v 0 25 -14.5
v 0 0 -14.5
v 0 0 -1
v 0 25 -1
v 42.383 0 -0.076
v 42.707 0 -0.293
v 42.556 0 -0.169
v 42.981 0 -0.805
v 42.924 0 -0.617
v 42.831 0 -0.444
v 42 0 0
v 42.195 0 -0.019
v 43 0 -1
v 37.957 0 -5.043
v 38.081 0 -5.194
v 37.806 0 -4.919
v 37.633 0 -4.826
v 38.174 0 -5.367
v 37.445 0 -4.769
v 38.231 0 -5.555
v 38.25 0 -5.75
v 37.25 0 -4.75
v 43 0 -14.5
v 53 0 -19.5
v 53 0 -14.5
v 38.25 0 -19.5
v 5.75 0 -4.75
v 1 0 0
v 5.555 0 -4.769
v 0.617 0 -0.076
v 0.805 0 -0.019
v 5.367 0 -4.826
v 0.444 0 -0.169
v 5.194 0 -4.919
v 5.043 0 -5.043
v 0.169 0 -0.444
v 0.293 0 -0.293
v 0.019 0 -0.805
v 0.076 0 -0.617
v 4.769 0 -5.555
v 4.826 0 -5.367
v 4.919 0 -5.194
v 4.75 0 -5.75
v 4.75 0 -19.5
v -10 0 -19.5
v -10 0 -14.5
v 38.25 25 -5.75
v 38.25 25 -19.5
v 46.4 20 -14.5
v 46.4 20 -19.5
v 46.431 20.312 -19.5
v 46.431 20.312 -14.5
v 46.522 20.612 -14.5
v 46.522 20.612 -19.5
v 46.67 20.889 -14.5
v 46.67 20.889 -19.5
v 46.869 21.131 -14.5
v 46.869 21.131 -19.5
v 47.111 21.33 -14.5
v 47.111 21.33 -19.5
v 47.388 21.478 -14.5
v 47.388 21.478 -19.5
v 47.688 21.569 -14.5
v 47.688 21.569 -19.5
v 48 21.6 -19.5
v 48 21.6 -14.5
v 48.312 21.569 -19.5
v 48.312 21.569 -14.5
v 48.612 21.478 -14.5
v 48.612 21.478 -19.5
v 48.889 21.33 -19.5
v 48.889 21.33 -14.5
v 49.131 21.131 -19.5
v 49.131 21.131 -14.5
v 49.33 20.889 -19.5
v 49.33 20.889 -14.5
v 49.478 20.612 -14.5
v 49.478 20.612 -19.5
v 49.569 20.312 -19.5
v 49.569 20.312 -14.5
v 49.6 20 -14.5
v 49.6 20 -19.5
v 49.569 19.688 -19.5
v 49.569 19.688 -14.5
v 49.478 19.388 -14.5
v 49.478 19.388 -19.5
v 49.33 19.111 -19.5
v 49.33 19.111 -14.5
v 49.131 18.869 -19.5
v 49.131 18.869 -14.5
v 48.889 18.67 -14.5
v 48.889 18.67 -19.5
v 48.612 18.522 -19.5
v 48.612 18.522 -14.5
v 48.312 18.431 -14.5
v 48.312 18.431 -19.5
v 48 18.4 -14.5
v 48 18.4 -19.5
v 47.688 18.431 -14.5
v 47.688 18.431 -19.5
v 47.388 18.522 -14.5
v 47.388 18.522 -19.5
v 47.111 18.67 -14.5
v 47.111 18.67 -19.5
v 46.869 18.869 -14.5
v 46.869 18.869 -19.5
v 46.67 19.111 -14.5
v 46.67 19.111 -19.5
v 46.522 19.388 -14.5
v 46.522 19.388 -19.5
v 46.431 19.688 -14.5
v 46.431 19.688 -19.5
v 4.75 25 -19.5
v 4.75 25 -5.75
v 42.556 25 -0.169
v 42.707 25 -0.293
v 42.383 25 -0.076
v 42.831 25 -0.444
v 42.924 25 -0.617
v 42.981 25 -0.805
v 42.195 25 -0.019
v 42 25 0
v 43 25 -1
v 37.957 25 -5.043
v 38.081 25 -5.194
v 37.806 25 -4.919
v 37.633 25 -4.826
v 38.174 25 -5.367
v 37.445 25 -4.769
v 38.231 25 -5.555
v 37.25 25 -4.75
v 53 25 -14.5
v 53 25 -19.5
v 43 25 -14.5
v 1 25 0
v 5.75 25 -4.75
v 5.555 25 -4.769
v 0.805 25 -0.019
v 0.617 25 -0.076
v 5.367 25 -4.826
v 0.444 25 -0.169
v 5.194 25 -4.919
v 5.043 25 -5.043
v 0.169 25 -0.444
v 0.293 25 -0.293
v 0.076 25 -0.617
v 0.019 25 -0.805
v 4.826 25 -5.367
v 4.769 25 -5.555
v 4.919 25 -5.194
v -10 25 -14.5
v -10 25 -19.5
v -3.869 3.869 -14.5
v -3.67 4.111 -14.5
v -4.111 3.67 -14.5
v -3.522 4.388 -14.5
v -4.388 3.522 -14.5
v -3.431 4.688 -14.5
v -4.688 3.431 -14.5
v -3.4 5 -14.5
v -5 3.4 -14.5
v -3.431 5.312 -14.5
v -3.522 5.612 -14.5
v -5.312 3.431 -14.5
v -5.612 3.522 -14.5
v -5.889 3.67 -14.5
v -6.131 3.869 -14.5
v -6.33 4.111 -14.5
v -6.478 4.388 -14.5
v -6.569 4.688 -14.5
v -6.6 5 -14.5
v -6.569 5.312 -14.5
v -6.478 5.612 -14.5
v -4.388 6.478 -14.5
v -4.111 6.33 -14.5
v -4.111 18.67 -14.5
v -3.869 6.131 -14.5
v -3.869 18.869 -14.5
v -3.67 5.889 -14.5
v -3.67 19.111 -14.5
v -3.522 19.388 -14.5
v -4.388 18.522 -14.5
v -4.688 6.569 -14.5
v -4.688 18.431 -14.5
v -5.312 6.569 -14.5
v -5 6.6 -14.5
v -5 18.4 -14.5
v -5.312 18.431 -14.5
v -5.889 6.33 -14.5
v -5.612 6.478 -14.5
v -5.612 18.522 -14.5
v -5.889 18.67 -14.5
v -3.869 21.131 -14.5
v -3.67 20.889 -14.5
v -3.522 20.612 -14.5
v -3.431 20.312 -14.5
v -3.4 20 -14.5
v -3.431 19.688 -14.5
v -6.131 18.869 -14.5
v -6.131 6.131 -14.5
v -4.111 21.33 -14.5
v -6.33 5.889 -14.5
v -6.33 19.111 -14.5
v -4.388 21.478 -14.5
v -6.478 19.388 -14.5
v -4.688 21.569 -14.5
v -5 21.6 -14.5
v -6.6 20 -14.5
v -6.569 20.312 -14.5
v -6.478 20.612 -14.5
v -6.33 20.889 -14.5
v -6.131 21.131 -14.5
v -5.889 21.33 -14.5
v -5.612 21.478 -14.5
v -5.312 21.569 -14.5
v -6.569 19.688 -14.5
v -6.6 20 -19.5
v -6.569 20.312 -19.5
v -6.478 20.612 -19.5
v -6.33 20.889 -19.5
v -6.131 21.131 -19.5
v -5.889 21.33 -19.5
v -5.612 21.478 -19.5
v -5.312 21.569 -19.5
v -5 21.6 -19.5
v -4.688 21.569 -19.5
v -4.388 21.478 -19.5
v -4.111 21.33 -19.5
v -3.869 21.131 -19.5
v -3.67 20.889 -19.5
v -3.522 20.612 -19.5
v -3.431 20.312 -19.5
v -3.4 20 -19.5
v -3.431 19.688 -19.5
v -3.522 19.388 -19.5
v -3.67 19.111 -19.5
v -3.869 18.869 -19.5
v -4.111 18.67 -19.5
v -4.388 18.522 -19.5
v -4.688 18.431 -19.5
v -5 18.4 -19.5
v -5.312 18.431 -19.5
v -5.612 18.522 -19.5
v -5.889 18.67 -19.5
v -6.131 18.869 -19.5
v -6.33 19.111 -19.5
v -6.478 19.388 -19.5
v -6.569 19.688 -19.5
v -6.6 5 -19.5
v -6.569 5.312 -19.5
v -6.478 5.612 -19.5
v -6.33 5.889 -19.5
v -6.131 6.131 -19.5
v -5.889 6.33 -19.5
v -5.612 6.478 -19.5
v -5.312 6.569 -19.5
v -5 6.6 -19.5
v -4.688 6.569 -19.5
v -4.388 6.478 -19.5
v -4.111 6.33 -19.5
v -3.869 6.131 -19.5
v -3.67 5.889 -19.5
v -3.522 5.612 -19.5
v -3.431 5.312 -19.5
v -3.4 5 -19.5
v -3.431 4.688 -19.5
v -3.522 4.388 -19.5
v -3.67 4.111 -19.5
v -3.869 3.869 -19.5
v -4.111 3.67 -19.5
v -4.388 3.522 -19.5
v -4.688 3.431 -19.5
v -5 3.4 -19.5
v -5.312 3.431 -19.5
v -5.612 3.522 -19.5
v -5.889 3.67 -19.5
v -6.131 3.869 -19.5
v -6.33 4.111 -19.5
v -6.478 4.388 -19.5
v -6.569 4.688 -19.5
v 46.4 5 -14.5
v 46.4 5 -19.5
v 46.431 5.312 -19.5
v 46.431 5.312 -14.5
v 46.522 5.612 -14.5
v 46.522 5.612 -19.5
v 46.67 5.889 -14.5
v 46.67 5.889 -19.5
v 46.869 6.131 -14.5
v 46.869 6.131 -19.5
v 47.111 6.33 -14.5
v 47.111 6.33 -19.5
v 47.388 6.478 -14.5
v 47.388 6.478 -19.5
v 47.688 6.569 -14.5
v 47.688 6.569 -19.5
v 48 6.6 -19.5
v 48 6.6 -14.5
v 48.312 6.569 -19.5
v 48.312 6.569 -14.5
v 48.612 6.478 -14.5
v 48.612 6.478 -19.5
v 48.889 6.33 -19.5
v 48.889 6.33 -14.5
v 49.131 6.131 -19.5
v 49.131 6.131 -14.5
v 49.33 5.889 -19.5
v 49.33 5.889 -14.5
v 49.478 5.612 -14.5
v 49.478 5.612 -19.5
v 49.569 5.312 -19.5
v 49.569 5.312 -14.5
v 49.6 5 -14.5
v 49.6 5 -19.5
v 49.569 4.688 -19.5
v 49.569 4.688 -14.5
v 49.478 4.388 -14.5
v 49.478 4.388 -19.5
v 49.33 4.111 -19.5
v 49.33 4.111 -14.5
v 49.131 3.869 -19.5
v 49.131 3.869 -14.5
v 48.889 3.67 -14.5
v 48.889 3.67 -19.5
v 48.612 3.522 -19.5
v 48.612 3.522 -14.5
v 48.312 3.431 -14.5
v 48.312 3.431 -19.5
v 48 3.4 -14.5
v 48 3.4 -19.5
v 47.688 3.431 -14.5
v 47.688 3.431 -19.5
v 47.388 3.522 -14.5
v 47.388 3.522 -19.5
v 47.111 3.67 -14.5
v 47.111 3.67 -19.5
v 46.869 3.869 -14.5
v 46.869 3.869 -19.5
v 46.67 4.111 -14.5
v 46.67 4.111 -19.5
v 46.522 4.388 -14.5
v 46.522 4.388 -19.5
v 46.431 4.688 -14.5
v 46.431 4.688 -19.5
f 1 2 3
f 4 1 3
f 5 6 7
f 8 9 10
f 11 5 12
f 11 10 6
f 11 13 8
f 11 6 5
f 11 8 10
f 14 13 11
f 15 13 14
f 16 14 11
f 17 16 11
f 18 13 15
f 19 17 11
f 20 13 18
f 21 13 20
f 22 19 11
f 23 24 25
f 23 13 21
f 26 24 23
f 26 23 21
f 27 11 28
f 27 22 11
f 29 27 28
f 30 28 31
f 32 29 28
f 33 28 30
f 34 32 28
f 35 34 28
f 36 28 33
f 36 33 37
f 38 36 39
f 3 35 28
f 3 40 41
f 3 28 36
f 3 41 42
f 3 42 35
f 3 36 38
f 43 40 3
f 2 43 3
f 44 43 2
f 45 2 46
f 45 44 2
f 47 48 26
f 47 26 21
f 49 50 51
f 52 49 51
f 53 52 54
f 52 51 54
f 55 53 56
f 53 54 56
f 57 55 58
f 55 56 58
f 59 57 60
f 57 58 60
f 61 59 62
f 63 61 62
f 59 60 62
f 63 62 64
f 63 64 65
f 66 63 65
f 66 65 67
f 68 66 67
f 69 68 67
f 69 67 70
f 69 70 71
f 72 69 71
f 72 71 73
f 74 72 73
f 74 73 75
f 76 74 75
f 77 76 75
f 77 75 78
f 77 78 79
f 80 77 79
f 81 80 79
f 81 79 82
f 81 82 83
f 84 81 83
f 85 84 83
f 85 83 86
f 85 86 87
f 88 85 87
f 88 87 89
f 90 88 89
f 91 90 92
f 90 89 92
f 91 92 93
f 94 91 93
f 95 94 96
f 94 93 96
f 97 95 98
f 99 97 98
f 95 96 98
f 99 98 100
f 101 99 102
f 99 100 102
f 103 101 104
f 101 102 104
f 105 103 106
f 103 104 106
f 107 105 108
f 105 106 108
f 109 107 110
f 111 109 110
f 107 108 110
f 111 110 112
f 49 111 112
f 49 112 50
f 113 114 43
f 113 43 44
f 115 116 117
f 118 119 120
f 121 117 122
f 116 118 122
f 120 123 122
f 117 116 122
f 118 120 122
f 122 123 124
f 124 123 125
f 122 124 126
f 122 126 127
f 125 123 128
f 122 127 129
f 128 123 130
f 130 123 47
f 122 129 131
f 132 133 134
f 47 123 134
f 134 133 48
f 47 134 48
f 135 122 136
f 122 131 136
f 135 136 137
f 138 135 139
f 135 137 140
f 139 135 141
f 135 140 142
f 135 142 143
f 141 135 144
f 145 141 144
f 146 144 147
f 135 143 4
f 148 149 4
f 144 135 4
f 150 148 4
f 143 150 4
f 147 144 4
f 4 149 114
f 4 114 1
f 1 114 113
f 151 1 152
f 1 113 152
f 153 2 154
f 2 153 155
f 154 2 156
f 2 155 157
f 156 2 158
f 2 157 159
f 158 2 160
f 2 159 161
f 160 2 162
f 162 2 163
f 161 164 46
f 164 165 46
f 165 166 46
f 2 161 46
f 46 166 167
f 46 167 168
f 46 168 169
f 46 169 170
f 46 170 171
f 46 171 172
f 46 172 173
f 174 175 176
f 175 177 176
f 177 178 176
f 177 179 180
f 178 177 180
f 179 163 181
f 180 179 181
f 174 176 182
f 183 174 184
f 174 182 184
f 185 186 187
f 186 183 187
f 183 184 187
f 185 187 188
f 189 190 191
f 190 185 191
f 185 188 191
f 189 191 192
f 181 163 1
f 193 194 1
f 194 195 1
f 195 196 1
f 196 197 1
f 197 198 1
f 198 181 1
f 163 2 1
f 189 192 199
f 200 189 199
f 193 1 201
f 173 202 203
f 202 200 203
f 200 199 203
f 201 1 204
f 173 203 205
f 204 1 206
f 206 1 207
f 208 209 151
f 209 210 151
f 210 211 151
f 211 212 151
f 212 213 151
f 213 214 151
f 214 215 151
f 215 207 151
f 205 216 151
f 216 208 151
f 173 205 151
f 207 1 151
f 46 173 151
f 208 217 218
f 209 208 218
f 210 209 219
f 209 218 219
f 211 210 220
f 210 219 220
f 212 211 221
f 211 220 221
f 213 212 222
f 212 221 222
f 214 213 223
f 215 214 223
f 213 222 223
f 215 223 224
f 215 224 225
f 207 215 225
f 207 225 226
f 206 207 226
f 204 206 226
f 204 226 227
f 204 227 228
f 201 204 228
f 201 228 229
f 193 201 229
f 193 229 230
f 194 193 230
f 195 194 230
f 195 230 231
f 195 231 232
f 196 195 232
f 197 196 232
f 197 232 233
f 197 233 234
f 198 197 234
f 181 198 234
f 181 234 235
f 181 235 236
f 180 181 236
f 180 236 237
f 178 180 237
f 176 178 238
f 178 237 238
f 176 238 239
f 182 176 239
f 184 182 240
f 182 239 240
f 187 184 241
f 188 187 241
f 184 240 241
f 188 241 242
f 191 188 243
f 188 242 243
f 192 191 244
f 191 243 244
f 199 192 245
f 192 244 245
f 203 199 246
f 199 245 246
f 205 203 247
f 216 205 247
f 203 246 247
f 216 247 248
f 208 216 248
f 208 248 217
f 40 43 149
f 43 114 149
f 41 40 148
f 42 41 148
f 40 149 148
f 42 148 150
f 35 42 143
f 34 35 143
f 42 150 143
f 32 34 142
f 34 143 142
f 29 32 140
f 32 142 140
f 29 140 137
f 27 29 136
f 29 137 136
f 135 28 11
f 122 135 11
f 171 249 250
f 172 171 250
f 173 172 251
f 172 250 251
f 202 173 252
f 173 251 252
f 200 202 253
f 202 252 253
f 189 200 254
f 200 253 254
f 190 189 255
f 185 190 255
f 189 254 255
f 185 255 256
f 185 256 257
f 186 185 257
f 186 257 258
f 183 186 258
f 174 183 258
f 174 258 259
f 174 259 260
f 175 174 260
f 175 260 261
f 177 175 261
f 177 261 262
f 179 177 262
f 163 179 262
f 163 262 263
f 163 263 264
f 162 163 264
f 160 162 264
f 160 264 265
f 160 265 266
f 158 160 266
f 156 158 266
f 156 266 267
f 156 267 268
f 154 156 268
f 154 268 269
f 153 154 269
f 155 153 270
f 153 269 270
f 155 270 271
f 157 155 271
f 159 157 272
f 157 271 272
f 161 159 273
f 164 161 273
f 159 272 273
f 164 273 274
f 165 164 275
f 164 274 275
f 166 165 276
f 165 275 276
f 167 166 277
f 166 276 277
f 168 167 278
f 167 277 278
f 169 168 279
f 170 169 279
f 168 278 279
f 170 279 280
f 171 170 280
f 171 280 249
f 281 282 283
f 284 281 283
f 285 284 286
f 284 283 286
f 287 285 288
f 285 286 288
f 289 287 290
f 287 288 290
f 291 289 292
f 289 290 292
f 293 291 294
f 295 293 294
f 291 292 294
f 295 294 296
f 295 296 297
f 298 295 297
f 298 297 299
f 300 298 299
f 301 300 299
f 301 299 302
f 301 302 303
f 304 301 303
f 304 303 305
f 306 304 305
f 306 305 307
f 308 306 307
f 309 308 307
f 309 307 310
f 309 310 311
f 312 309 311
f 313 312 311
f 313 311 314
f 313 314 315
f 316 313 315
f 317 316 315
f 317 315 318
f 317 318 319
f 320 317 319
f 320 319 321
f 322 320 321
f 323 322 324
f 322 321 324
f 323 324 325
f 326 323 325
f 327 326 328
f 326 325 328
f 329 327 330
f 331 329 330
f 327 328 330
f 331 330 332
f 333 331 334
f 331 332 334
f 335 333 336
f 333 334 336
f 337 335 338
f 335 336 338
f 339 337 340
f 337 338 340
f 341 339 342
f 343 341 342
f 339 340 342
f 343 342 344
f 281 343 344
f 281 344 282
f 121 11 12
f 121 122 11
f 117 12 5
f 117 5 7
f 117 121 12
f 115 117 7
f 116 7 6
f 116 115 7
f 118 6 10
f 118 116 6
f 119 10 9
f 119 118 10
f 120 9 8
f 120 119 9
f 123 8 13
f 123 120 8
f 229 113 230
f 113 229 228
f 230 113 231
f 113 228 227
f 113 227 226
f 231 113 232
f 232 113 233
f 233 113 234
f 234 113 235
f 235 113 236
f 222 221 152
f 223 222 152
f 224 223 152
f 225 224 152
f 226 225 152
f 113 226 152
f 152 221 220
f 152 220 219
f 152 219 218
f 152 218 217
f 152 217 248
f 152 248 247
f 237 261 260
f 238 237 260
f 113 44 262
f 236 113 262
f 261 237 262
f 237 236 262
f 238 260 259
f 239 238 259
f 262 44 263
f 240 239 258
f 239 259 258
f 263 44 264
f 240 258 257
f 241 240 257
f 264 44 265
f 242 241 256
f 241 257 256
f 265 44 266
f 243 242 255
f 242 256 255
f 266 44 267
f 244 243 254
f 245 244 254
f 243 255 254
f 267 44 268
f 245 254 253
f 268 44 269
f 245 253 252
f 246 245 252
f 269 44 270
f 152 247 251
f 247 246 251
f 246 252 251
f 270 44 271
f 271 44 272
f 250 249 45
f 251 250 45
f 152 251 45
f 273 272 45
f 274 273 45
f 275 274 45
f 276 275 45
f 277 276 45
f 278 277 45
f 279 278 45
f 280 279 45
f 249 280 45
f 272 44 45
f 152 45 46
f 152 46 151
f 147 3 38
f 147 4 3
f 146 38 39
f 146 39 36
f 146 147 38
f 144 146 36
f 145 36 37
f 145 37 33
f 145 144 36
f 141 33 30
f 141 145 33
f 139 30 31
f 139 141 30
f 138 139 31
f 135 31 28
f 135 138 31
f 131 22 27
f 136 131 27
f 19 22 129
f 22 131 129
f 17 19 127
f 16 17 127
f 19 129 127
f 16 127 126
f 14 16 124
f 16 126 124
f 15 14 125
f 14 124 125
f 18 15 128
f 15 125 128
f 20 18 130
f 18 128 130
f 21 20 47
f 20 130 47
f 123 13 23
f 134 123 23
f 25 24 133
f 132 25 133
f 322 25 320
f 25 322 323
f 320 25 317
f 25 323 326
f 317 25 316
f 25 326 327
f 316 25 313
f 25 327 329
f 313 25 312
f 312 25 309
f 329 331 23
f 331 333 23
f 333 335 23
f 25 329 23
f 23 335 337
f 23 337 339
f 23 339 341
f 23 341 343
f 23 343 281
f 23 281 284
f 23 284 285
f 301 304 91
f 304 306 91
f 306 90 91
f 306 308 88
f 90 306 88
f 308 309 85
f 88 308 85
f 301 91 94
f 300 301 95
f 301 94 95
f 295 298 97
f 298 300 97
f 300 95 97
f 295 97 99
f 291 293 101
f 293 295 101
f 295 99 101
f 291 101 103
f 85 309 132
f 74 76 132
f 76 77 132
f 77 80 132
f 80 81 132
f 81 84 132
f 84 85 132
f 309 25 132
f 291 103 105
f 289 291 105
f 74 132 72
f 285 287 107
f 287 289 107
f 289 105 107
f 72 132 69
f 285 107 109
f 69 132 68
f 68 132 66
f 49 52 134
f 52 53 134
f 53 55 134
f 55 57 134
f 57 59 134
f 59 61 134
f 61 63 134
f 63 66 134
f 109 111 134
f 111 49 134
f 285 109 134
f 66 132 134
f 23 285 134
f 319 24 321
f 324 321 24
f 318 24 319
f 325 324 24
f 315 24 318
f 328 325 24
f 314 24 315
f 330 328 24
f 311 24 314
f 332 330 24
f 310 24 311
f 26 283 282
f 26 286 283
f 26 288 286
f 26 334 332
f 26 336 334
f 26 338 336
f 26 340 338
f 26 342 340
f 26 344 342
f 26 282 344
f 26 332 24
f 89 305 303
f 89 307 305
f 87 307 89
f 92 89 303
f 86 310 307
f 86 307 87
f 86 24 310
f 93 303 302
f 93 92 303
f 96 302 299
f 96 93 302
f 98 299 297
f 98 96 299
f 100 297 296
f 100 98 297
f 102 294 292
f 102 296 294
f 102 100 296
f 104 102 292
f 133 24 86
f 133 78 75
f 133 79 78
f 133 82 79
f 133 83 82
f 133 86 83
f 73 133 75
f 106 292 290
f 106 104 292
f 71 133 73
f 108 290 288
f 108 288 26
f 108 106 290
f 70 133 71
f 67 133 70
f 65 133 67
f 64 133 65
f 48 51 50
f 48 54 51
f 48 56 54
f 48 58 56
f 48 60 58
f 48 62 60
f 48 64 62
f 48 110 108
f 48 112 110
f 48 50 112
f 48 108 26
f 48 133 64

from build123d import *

# Parameters (mm, degrees)
EXTRUDE_1_DEPTH     = 25
SKETCH_2_W          = 10
SKETCH_2_H          = 25
EXTRUDE_2_DEPTH     = 5
FILLET_1_R          = 1
SKETCH_3_R          = 1.6
CUT_EXTRUDE_1_DEPTH = 20.5
FILLET_2_R          = 1


with BuildPart() as part:
    # Эскиз1 → Бобышка-Вытянуть1 (new body)
    with BuildSketch(Plane(origin=(0, 0, 0), x_dir=(1, 0, 0), z_dir=(0, 1, 0))):
        Polygon((0, 0), (43, 0), (43, 19.5), (38.25, 19.5), (38.25, 4.75), (4.75, 4.75), (4.75, 19.5), (0, 19.5), align=None)
    extrude(amount=EXTRUDE_1_DEPTH)

    # Эскиз2 → Бобышка-Вытянуть2 (add)
    with BuildSketch(Plane(origin=(0, 0, -19.5), x_dir=(-1, 0, 0), z_dir=(0, 0, -1))):
        with Locations((-48, 12.5)):
            Rectangle(SKETCH_2_W, SKETCH_2_H)
        with Locations((5, 12.5)):
            Rectangle(SKETCH_2_W, SKETCH_2_H)
    extrude(amount=-EXTRUDE_2_DEPTH)

    # Скругление1
    fillet_1_edges = [part.edges().sort_by_distance(p)[0] for p in [
        (4.75, 12.5, -4.75),
        (38.25, 12.5, -4.75),
    ]]
    fillet(fillet_1_edges, radius=FILLET_1_R)

    # Эскиз3 → Вырез-Вытянуть1 (cut, through all)
    with BuildSketch(Plane(origin=(0, 0, -19.5), x_dir=(-1, 0, 0), z_dir=(0, 0, -1))):
        with Locations((5, 20)):
            Circle(SKETCH_3_R)
        with Locations((5, 5)):
            Circle(SKETCH_3_R)
        with Locations((-48, 20)):
            Circle(SKETCH_3_R)
        with Locations((-48, 5)):
            Circle(SKETCH_3_R)
    extrude(amount=-CUT_EXTRUDE_1_DEPTH, mode=Mode.SUBTRACT)

    # Скругление2
    fillet_2_edges = [part.edges().sort_by_distance(p)[0] for p in [
        (0, 12.5, 0),
        (43, 12.5, 0),
    ]]
    fillet(fillet_2_edges, radius=FILLET_2_R)


solid = part.part
